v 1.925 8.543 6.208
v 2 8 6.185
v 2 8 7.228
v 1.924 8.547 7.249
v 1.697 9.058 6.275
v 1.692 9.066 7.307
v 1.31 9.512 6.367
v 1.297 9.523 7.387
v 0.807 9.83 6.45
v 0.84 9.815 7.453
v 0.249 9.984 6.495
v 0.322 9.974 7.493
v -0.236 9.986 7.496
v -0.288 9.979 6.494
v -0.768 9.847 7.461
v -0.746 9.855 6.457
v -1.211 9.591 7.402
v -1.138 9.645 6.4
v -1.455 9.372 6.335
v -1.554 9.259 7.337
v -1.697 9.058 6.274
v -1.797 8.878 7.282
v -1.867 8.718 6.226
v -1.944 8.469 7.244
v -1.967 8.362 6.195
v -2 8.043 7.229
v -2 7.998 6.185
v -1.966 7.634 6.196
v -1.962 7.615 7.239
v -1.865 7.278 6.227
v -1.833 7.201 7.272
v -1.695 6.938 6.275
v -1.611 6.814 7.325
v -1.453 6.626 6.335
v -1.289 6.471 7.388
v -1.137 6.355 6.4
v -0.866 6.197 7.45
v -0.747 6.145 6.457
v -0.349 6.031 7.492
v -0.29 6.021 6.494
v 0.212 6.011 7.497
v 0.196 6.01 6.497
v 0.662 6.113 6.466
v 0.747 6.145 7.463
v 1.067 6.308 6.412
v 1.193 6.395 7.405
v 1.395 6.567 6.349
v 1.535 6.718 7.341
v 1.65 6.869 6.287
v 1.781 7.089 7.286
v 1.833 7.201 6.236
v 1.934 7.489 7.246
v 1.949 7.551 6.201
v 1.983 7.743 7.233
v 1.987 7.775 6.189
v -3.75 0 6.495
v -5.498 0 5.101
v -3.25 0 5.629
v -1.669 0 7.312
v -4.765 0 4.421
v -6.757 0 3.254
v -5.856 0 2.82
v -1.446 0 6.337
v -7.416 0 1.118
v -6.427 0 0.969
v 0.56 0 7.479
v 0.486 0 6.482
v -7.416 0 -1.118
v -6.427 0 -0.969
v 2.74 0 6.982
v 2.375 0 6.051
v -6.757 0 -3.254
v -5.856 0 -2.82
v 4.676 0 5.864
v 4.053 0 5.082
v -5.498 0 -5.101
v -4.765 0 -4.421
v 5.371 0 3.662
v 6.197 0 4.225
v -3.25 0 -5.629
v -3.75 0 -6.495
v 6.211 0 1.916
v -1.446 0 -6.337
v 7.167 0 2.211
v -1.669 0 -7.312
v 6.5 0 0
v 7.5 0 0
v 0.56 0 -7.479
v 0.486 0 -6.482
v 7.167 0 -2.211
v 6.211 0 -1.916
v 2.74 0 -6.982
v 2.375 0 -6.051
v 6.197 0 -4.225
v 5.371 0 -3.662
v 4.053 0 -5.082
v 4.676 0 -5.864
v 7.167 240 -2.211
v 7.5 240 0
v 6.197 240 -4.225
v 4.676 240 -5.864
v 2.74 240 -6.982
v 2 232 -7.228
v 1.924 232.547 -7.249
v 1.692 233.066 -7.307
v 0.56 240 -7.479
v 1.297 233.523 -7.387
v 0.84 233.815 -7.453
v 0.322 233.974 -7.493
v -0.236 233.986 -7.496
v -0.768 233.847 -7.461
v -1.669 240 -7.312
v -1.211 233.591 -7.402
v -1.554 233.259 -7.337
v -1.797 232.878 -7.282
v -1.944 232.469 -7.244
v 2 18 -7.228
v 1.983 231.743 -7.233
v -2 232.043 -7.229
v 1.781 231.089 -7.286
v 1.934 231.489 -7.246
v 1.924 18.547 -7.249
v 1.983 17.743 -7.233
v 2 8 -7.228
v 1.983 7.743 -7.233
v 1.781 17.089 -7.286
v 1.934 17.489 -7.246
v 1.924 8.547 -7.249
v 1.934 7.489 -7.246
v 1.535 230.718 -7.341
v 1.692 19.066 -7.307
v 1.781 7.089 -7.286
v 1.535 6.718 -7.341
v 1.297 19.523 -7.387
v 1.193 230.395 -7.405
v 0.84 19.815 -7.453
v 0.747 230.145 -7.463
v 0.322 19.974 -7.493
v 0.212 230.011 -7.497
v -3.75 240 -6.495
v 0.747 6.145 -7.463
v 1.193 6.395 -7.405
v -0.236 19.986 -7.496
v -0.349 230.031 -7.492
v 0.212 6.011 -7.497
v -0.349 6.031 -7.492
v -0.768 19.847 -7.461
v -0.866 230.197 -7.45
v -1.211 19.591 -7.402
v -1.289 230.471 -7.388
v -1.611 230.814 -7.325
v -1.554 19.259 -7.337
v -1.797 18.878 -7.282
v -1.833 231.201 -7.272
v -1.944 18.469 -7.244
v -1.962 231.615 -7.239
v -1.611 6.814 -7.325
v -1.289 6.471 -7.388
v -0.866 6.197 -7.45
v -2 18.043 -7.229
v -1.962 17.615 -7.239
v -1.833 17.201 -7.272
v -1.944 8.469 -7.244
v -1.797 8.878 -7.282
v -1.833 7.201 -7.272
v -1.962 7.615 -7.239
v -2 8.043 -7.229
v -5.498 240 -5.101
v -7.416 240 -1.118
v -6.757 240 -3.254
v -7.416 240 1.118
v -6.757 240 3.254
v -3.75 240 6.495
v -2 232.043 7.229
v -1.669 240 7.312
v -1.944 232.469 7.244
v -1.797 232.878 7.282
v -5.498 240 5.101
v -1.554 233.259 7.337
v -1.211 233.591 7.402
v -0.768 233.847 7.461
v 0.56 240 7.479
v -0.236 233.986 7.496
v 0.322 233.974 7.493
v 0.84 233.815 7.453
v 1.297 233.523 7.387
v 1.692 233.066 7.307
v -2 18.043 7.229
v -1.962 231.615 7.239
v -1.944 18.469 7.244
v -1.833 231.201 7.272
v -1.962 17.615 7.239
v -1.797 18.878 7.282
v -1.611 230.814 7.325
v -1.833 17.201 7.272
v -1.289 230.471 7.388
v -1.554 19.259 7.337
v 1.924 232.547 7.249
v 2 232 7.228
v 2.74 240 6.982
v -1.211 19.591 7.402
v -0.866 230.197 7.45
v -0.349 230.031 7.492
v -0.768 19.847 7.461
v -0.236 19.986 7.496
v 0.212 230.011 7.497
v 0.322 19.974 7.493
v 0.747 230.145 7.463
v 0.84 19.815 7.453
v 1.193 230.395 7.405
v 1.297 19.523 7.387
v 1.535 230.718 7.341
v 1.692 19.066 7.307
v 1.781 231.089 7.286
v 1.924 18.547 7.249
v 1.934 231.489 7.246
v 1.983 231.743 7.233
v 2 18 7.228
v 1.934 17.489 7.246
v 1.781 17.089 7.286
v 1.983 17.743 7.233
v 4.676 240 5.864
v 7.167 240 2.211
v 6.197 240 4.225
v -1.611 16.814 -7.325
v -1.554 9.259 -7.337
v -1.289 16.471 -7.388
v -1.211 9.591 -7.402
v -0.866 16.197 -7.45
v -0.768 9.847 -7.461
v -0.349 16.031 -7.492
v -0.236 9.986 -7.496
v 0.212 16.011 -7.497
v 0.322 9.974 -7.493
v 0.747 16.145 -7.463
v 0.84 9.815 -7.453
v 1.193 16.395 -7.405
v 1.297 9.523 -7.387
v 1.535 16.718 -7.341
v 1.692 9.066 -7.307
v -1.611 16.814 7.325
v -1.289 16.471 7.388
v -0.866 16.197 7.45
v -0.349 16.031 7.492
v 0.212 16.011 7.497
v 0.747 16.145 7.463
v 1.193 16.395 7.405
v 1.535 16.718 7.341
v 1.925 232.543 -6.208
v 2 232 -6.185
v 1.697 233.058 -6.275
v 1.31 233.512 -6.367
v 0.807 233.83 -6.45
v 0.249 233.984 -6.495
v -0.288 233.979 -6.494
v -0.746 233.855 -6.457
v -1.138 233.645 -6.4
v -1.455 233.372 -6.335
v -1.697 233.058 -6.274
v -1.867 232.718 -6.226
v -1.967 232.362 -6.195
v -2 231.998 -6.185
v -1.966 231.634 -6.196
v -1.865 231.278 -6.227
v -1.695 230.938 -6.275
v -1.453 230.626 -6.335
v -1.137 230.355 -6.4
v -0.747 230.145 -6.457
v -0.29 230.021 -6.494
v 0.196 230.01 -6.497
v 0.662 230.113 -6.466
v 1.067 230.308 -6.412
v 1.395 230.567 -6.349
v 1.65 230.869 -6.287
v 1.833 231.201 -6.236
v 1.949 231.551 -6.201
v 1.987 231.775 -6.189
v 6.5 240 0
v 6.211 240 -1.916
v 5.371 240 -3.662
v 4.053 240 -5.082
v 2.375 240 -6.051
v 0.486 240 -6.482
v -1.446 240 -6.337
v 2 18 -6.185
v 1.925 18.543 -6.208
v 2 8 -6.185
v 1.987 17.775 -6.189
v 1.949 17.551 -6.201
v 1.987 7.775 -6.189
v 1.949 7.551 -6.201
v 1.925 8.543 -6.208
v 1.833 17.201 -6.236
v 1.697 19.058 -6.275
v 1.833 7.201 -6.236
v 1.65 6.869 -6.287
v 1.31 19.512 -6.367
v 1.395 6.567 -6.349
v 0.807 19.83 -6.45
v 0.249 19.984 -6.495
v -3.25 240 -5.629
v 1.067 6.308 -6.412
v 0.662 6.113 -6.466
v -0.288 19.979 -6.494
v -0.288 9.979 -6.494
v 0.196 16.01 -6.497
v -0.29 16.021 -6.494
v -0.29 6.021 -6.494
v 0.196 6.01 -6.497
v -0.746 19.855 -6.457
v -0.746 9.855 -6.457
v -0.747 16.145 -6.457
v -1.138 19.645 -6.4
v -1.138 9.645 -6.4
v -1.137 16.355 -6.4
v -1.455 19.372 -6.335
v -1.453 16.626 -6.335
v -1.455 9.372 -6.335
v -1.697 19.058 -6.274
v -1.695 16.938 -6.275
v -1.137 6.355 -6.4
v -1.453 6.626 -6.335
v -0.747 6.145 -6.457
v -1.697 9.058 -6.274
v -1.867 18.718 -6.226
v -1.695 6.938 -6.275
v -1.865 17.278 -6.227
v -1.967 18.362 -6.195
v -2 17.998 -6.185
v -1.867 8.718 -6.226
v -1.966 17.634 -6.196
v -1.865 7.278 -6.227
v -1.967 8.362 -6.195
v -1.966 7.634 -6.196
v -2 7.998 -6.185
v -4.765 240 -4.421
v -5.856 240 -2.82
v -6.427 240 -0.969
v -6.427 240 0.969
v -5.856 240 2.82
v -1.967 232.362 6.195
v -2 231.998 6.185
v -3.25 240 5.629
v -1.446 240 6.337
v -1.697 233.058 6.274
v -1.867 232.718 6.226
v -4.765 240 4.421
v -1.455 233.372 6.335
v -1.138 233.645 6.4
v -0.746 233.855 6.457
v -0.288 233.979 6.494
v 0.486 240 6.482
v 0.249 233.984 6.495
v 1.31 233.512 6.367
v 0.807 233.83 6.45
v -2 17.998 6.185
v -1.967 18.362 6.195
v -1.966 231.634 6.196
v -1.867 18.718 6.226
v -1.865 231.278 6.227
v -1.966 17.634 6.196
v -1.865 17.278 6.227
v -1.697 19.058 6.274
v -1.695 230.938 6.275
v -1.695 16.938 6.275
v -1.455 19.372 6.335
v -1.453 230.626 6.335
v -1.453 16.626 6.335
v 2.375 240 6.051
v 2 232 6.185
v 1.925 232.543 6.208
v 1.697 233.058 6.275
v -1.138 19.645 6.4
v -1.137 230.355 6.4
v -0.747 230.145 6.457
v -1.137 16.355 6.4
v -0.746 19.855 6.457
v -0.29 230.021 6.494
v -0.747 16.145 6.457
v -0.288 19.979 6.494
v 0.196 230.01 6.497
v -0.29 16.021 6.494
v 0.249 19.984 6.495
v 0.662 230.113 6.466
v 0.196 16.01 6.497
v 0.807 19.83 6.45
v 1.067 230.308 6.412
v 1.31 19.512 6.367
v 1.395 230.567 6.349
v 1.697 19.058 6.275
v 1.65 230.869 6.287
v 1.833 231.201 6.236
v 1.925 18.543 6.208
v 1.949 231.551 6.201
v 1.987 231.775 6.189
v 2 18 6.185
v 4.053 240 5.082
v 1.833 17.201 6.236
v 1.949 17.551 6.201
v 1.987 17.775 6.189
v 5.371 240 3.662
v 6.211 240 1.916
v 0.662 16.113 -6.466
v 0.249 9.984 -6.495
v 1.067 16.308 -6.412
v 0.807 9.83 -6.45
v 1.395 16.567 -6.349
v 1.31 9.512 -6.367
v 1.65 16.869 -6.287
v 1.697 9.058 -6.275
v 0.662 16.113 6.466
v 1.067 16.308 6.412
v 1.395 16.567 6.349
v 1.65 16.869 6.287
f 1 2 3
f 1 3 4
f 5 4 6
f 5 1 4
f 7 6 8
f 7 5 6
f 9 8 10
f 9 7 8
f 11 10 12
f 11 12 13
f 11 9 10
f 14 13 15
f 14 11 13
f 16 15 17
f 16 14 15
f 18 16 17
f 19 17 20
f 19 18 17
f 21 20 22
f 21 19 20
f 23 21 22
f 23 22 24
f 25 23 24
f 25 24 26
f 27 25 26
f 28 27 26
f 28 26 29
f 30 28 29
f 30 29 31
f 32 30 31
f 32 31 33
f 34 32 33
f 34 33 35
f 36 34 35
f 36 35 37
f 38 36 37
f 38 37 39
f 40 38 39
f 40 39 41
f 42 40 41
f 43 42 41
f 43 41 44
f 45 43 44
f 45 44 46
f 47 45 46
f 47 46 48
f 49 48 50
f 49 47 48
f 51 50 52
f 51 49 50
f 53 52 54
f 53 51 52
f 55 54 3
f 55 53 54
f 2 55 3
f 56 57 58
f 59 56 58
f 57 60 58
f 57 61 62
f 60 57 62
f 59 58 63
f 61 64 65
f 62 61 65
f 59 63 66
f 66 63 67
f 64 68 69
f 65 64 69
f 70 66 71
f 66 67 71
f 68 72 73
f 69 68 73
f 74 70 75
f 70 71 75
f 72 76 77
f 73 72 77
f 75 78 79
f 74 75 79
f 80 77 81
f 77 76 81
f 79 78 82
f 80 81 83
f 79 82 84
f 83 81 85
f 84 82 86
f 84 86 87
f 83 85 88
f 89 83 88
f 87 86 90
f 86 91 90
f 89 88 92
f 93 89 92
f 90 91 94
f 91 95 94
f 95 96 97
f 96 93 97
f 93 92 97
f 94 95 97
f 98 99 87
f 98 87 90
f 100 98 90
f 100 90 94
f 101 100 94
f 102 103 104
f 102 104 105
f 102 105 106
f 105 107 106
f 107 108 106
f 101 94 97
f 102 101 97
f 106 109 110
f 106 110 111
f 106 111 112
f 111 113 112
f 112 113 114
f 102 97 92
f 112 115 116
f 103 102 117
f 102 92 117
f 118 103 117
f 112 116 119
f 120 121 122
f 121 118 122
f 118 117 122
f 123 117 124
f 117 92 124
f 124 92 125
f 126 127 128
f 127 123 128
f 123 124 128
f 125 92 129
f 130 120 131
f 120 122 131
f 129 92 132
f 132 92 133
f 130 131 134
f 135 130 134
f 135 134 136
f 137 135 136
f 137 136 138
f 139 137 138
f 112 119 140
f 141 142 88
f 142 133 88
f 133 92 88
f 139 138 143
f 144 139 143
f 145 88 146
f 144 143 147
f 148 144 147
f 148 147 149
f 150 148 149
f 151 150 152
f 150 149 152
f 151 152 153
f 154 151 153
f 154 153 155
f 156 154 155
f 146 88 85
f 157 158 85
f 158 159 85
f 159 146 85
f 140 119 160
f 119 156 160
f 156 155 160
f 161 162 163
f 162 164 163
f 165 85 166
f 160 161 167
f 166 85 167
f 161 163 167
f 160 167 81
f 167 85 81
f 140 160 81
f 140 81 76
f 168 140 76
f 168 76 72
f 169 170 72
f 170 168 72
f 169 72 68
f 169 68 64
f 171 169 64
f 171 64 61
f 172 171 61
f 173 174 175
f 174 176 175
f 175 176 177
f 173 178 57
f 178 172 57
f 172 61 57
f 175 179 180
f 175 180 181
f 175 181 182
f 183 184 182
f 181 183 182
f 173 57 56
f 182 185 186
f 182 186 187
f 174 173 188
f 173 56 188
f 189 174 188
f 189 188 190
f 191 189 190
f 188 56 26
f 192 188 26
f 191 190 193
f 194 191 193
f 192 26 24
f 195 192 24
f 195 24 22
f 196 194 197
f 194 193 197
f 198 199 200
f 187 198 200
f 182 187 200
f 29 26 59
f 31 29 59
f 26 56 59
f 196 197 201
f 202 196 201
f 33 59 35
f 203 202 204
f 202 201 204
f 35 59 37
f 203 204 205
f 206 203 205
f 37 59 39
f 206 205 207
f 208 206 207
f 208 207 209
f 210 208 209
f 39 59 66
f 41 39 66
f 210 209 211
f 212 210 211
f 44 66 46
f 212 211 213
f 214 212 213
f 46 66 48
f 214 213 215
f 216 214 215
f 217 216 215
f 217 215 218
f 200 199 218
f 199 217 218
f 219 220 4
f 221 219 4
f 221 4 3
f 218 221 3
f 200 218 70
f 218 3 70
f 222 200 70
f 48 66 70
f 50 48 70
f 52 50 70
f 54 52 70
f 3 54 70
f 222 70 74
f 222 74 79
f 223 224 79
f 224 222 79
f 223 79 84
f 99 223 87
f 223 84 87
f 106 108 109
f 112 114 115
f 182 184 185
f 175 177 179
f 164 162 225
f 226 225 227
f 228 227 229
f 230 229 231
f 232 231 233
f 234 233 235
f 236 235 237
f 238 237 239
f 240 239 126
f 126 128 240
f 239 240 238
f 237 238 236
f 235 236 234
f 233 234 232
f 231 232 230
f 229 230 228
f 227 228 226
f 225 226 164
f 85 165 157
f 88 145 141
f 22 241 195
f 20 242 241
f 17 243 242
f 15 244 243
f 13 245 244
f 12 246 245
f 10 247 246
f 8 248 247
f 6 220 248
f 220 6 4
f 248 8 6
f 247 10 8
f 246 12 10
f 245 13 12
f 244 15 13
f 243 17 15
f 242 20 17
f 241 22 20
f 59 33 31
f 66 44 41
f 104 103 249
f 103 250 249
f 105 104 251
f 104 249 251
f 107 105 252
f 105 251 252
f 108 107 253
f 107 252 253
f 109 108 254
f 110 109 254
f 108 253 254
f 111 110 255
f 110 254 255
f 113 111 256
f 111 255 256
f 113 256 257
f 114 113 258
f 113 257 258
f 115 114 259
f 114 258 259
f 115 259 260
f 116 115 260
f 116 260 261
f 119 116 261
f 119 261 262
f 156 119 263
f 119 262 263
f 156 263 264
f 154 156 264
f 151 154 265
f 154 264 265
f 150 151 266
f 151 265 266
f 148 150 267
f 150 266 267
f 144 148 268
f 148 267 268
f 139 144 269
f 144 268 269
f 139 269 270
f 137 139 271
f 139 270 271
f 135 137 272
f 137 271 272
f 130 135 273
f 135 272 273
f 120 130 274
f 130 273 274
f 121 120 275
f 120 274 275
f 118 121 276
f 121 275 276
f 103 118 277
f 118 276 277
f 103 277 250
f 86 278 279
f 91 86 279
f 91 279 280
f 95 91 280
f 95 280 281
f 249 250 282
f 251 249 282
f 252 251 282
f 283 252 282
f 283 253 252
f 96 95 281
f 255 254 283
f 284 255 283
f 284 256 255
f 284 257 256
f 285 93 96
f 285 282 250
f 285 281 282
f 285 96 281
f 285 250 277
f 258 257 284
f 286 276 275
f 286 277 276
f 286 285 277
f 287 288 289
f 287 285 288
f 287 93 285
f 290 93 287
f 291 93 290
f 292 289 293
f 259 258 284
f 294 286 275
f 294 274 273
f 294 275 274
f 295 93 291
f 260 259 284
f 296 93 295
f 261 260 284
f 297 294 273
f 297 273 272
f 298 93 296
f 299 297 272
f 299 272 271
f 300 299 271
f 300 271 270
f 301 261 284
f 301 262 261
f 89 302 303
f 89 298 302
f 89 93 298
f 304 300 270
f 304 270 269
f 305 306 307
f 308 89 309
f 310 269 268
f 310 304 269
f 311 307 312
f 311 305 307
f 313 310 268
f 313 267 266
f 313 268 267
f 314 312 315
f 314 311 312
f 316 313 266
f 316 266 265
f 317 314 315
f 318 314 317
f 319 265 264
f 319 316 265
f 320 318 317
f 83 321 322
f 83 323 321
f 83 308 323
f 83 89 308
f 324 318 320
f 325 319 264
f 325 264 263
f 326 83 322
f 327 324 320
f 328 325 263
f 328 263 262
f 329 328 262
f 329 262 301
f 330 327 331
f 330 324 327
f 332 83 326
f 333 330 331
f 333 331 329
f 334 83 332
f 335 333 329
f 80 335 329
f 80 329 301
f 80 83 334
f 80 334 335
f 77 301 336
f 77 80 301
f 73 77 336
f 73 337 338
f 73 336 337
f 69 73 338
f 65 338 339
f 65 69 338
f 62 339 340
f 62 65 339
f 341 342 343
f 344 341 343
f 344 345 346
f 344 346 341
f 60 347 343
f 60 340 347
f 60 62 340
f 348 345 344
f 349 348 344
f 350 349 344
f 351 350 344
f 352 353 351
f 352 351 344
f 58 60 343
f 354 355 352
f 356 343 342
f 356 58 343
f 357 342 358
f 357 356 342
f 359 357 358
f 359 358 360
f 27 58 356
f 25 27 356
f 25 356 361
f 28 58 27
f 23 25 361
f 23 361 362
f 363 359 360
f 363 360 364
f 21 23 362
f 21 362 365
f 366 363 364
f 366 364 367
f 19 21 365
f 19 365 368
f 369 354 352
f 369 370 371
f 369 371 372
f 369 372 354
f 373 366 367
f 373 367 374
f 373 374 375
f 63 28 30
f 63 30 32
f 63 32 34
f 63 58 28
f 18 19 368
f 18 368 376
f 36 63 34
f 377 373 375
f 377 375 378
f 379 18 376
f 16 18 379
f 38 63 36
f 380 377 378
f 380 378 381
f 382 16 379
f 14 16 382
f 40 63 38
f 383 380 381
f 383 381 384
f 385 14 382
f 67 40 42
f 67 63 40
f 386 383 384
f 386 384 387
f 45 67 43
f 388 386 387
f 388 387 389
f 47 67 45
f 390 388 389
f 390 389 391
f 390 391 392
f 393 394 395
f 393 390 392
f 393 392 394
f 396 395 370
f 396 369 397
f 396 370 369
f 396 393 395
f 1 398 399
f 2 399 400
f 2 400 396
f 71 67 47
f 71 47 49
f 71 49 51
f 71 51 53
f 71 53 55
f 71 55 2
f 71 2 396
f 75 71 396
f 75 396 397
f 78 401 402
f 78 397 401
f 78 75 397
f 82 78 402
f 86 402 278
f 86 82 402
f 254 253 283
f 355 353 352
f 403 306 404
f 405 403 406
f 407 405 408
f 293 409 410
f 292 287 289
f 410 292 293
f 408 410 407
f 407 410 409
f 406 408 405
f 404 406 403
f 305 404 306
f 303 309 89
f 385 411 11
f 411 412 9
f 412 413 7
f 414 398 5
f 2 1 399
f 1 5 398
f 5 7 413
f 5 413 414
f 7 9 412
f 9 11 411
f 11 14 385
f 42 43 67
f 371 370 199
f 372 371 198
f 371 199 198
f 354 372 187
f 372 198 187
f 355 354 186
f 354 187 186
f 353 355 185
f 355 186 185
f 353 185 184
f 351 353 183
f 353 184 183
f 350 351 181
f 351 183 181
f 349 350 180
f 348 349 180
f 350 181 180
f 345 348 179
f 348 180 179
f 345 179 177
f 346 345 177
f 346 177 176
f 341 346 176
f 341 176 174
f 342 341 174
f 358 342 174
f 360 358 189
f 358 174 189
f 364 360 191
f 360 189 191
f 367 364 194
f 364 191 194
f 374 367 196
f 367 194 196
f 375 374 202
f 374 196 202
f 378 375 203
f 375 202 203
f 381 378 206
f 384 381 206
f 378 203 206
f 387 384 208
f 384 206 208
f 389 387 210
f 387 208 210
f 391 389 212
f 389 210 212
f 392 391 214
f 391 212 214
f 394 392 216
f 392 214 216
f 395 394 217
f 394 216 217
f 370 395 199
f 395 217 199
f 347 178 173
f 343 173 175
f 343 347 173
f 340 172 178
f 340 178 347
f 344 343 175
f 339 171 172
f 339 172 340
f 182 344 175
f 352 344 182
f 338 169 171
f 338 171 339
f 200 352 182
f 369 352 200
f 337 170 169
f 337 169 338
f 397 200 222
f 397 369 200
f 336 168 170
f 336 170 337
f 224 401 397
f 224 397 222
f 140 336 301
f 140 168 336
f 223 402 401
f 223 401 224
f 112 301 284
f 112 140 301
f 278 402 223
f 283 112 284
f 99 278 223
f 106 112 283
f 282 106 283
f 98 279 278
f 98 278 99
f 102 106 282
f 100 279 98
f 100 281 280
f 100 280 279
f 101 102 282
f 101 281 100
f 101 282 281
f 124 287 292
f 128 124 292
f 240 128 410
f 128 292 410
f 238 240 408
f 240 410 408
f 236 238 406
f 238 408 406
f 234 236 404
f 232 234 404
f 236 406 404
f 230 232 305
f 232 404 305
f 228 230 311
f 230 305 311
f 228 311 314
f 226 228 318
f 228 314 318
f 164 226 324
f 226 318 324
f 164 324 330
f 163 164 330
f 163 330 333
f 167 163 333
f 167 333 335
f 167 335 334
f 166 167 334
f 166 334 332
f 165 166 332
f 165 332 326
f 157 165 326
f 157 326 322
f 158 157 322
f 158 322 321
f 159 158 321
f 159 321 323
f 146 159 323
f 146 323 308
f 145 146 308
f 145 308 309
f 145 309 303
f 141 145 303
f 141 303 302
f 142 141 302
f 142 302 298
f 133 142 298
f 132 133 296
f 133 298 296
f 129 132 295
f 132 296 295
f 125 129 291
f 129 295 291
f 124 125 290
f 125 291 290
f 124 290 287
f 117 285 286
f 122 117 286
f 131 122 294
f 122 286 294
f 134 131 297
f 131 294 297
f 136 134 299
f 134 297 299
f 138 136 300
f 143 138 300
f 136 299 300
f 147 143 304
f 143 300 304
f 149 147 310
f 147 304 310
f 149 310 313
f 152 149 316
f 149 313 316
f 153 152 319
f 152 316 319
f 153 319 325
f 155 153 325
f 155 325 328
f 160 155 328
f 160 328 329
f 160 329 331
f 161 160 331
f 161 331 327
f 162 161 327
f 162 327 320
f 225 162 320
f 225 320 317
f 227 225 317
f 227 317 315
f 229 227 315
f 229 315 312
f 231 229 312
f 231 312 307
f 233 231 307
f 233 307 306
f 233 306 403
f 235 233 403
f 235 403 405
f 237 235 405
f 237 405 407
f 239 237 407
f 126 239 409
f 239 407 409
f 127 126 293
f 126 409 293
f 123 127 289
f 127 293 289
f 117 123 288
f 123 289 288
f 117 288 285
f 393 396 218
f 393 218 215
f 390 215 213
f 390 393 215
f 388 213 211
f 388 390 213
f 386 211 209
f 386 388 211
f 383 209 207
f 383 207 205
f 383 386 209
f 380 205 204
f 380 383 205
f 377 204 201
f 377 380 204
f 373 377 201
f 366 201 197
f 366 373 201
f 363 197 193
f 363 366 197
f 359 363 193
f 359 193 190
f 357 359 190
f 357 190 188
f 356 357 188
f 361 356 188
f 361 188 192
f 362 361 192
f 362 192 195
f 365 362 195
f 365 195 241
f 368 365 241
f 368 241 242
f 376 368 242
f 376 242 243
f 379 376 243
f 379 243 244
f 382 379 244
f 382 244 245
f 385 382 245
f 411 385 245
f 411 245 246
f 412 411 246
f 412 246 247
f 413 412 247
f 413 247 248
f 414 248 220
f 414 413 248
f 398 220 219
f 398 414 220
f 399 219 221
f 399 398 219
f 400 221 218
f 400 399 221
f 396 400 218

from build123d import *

# Parameters (mm, degrees)
SKETCH1_R           = 7.5
SKETCH1_R_2         = 6.5
BOSS_EXTRUDE1_DEPTH = 240
SKETCH2_R           = 2
CUT_EXTRUDE1_DEPTH  = 9


with BuildPart() as part:
    # Sketch1 → Boss-Extrude1 (new body)
    with BuildSketch(Plane(origin=(0, 0, 0), x_dir=(1, 0, 0), z_dir=(0, 1, 0))):
        Circle(SKETCH1_R)
        Circle(SKETCH1_R_2, mode=Mode.SUBTRACT)
    extrude(amount=BOSS_EXTRUDE1_DEPTH)

    # Sketch2 → Cut-Extrude1 (cut, symmetric)
    with BuildSketch(Plane.XY):
        with Locations((0, 8)):
            Circle(SKETCH2_R)
        with Locations((0, 18)):
            Circle(SKETCH2_R)
        with Locations((0, 242)):
            Circle(SKETCH2_R)
        with Locations((0, 232)):
            Circle(SKETCH2_R)
    extrude(amount=CUT_EXTRUDE1_DEPTH, both=True, mode=Mode.SUBTRACT)


solid = part.part
